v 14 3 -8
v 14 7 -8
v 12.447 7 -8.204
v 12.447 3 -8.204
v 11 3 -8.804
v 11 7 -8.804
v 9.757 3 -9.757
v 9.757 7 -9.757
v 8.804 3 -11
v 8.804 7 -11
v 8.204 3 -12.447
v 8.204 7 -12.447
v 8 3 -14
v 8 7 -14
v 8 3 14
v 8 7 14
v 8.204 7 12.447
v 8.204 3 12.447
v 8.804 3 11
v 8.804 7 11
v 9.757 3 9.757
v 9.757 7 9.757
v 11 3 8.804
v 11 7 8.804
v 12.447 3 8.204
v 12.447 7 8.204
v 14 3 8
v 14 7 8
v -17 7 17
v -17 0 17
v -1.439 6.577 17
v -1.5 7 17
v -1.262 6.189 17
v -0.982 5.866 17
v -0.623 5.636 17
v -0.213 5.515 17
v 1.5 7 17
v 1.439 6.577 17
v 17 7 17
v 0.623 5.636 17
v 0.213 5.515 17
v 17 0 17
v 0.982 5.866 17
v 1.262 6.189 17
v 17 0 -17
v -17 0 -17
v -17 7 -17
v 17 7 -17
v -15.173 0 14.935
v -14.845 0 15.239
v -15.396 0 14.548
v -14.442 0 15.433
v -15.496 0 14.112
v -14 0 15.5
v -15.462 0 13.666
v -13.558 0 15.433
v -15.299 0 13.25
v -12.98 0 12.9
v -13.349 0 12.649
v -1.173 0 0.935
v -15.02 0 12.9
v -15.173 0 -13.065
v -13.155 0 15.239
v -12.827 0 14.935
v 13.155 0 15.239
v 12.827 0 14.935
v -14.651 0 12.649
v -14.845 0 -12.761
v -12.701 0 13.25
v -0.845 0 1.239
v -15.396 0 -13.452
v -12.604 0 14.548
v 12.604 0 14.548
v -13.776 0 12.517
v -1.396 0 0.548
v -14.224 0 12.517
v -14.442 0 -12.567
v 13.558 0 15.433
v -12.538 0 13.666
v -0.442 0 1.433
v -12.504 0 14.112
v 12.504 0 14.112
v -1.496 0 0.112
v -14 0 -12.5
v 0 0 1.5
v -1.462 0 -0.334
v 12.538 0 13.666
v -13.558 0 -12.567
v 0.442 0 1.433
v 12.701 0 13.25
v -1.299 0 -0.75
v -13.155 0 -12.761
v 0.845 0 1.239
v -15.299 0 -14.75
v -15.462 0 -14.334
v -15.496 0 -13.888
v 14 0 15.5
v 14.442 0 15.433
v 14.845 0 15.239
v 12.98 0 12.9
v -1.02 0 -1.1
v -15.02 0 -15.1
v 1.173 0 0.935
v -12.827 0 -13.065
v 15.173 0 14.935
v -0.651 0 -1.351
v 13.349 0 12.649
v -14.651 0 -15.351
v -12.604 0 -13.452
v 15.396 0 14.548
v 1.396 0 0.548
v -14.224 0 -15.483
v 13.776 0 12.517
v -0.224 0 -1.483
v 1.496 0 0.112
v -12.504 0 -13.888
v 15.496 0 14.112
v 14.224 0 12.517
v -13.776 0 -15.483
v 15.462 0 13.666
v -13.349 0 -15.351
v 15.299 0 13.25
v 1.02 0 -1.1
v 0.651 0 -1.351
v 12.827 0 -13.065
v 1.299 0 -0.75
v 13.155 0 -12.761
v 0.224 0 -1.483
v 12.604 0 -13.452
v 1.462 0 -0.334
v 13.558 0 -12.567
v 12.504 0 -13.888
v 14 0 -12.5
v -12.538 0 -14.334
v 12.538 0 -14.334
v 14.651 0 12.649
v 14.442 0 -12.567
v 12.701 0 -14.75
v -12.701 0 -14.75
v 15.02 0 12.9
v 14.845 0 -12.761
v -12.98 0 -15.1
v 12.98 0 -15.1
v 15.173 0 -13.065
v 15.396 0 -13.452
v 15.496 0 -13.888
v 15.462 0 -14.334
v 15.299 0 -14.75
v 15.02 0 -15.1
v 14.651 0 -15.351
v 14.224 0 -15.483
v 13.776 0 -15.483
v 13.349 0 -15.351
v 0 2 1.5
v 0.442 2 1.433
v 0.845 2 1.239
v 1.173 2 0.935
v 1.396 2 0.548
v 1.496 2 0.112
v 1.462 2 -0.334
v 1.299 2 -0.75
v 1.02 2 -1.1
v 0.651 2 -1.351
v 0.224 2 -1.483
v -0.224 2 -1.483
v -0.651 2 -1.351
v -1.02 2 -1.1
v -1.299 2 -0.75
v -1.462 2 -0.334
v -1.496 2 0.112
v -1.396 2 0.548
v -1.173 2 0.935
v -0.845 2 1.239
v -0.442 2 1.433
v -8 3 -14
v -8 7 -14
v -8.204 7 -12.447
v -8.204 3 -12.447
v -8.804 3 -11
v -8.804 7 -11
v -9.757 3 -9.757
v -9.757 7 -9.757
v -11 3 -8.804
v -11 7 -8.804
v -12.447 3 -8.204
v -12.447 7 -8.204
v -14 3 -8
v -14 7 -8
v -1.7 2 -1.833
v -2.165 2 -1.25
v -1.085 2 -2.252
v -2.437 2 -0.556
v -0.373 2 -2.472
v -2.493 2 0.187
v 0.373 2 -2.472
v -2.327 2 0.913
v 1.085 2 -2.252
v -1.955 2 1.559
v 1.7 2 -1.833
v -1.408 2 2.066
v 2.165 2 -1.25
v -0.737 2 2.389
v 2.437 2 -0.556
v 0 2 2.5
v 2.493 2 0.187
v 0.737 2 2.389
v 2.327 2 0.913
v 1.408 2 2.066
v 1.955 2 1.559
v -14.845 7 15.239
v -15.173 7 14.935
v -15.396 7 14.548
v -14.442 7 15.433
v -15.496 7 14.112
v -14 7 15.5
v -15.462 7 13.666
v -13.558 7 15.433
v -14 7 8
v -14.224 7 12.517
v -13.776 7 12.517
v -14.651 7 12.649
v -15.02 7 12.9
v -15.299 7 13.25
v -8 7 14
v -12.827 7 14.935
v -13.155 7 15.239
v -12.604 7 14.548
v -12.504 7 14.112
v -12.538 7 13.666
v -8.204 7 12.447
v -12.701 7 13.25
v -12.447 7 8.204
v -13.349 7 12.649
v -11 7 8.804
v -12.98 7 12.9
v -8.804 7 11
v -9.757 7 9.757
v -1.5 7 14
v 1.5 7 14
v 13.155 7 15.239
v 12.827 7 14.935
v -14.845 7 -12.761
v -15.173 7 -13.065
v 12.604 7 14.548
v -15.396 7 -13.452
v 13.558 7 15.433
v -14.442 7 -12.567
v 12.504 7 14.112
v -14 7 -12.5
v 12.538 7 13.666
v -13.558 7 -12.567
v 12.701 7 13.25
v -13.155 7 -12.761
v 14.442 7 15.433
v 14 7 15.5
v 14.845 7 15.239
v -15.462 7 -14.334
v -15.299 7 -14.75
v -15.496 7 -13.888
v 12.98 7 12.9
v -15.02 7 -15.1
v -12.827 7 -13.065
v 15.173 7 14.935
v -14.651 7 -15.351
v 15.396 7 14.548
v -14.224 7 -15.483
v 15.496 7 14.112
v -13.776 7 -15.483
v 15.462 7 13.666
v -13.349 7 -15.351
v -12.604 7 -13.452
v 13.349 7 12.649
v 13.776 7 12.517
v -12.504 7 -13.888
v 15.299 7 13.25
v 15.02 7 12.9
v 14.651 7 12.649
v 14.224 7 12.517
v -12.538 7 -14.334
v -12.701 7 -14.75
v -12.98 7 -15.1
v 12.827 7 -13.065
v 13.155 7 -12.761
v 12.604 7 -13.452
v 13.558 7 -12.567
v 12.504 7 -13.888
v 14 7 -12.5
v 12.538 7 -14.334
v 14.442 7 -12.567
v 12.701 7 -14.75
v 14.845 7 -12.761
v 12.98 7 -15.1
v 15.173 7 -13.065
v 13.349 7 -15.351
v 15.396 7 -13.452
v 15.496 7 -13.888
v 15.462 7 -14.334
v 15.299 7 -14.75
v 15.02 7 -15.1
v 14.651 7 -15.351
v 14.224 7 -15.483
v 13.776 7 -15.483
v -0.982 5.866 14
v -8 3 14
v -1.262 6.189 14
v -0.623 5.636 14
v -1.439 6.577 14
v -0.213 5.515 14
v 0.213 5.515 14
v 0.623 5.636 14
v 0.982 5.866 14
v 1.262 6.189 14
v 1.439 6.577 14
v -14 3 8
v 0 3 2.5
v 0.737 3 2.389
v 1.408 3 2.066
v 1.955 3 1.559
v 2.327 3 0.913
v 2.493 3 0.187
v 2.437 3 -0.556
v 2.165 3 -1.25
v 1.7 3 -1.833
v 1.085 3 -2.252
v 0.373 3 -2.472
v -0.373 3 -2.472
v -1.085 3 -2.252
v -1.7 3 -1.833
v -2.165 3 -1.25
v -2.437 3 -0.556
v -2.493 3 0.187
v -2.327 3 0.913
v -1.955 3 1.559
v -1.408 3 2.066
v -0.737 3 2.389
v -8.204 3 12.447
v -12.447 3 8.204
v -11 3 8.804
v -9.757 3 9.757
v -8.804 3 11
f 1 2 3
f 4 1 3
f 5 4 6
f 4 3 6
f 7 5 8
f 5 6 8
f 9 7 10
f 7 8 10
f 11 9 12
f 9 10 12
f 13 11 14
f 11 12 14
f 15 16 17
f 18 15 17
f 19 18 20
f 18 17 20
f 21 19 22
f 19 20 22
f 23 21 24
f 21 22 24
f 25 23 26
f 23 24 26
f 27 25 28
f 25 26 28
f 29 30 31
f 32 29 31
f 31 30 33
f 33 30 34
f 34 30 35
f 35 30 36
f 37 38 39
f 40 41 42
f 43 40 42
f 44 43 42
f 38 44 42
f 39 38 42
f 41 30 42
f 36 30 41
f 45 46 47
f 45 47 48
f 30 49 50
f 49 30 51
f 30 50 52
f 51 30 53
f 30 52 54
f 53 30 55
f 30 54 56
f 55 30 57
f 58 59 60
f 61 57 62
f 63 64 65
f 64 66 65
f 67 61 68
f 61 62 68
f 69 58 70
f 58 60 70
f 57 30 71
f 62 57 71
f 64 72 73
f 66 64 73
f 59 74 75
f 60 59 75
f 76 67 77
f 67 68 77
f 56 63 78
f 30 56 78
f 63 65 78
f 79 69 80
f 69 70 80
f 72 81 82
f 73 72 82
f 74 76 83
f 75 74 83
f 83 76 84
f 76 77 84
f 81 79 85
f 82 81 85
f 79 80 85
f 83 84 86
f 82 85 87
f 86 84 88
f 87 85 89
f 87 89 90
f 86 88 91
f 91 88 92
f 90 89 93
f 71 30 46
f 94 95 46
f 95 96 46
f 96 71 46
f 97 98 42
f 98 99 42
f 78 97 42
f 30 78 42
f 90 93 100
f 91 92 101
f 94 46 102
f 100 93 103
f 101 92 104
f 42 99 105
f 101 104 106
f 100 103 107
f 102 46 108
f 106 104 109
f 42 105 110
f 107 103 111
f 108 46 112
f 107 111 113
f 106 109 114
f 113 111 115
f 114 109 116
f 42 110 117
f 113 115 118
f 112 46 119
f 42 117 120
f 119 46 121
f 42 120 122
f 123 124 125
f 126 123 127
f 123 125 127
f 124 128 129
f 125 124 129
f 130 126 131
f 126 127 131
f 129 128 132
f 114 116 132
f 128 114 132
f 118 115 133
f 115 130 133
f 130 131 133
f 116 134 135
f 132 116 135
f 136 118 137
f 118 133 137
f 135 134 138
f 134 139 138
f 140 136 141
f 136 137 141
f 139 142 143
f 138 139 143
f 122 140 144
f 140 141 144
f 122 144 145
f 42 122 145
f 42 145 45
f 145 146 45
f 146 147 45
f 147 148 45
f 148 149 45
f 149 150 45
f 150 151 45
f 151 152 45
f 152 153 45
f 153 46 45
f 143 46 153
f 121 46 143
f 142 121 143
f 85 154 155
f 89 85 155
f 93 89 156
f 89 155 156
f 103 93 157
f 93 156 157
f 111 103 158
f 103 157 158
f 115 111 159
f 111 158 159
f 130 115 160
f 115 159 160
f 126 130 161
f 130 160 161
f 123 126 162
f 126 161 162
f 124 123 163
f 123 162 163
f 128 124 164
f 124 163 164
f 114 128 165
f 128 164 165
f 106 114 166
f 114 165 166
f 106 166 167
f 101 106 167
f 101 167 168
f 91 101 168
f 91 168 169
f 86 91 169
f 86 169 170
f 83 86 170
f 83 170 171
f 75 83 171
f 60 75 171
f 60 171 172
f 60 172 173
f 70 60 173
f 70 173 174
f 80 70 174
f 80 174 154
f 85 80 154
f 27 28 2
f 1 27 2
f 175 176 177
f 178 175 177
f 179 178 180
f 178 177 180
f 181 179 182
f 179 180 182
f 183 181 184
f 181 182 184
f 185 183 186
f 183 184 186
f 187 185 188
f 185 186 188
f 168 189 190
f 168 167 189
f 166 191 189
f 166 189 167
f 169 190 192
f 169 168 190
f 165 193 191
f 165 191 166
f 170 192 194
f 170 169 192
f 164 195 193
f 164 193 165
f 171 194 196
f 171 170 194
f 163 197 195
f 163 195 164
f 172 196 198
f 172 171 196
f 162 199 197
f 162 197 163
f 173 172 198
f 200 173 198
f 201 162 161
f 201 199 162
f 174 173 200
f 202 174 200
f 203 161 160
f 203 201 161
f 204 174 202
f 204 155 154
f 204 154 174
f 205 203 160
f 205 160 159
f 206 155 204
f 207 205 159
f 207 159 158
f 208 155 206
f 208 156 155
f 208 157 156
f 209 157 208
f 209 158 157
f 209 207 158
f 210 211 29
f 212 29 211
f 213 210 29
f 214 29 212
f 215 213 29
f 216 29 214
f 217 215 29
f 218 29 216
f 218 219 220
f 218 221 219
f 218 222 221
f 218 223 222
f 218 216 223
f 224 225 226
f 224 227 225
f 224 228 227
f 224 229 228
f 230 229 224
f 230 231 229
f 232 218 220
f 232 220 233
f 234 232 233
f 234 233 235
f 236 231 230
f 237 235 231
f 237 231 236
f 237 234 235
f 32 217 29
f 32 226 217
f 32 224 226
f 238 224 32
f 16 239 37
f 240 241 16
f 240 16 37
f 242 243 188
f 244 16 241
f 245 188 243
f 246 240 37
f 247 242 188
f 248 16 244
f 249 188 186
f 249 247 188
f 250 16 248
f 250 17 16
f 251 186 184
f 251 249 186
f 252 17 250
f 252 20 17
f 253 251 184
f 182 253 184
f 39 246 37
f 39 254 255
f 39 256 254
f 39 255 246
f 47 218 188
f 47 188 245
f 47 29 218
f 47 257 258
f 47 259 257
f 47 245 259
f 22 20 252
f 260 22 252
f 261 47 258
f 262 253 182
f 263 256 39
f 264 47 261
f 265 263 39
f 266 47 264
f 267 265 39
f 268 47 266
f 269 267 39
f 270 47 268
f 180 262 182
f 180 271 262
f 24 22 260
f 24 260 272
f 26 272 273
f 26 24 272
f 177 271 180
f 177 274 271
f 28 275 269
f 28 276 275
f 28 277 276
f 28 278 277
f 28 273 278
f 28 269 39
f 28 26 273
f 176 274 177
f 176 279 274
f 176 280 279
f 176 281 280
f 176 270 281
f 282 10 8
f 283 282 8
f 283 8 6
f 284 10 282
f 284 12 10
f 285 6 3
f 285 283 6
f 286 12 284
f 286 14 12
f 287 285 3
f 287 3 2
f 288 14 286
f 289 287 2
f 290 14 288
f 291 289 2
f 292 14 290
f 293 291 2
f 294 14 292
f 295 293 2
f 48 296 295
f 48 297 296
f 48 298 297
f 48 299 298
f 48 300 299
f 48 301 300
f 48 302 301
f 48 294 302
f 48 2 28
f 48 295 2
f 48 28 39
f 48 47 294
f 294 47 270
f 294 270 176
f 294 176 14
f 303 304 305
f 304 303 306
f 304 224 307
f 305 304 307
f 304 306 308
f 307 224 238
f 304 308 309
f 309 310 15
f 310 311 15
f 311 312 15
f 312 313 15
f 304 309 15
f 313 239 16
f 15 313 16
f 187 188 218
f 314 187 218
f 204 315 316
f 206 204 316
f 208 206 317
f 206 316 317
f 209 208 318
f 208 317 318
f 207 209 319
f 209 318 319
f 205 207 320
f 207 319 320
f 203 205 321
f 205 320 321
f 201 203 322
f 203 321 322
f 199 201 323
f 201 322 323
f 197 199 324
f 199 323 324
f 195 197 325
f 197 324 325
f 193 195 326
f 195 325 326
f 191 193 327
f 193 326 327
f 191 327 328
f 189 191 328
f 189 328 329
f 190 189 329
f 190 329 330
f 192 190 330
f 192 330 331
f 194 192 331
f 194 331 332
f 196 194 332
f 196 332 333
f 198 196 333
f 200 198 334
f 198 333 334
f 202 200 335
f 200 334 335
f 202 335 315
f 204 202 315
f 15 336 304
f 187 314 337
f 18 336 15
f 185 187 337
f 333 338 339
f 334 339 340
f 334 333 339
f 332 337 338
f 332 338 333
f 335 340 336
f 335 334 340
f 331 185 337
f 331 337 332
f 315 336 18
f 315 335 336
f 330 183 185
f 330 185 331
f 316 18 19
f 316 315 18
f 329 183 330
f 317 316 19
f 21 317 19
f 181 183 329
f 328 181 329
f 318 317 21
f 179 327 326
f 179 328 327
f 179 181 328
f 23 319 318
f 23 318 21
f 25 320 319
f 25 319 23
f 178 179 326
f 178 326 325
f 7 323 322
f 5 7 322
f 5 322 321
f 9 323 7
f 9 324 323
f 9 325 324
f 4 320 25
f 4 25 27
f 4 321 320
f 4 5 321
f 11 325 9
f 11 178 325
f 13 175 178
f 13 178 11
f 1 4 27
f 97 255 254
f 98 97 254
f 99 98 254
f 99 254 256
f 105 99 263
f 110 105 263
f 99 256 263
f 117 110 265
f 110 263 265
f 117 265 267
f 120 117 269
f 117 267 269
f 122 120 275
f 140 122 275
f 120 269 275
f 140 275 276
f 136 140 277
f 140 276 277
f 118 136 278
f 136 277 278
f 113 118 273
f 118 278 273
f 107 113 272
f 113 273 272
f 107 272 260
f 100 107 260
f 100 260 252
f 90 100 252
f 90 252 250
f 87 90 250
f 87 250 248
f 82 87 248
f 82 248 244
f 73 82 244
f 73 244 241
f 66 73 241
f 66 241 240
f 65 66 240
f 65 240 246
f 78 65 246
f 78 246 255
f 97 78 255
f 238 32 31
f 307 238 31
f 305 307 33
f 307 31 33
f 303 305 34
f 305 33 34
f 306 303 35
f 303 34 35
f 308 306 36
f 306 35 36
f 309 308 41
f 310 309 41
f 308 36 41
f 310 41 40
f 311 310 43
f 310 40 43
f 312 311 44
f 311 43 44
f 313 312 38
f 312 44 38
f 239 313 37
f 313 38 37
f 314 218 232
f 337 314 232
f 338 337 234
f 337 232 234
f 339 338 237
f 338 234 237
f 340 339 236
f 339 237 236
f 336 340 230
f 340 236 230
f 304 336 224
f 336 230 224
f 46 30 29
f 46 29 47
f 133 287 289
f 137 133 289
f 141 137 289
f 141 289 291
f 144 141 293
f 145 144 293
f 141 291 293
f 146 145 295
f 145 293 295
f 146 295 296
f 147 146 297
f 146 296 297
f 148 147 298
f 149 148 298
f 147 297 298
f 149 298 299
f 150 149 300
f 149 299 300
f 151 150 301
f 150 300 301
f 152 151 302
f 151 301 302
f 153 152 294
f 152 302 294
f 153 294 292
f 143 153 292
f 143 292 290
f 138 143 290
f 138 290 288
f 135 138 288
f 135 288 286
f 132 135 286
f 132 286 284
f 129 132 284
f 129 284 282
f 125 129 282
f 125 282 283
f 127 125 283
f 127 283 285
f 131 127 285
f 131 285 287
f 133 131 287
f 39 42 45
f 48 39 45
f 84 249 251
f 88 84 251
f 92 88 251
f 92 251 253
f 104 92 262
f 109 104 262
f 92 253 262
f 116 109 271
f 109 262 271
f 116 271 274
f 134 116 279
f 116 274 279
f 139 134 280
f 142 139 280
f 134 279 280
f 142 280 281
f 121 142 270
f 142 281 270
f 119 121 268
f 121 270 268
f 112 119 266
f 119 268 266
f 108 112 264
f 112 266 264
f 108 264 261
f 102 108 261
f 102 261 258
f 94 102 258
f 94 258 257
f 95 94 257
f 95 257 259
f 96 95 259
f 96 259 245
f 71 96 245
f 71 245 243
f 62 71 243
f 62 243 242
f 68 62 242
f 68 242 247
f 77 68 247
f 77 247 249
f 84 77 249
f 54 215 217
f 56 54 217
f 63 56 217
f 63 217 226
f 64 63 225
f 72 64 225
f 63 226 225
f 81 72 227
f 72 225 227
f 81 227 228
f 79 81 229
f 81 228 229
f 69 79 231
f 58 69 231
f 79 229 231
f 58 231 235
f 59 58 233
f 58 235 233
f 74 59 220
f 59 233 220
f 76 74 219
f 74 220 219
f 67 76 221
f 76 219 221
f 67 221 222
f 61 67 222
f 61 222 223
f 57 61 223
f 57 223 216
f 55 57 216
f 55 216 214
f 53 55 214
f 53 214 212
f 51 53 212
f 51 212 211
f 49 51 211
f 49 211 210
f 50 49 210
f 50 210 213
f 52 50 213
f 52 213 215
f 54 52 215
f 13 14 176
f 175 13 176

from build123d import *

# Parameters (mm, degrees)
SKETCH1_W           = 34
SKETCH1_H           = 34
BOSS_EXTRUDE1_DEPTH = 7
CUT_EXTRUDE1_DEPTH  = 4
SKETCH3_R           = 1.5
CUT_EXTRUDE2_DEPTH  = 10
SKETCH4_R           = 1.5
CUT_EXTRUDE3_DEPTH  = 10
SKETCH5_R           = 1.5
CUT_EXTRUDE4_DEPTH  = 10
SKETCH6_R           = 2.5
CUT_EXTRUDE5_DEPTH  = 1


with BuildPart() as part:
    # Sketch1 → Boss-Extrude1 (new body)
    with BuildSketch(Plane(origin=(0, 0, 0), x_dir=(1, 0, 0), z_dir=(0, 1, 0))):
        Rectangle(SKETCH1_W, SKETCH1_H)
    extrude(amount=BOSS_EXTRUDE1_DEPTH)

    # Sketch2 → Cut-Extrude1 (cut)
    with BuildSketch(Plane(origin=(0, 7, 0), x_dir=(1, 0, 0), z_dir=(0, 1, 0))):
        with BuildLine():
            Line((8, 14), (-8, 14))
            ThreePointArc((-8, 14), (-9.757359313, 9.757359313), (-14, 8))
            Line((-14, 8), (-14, -8))
            ThreePointArc((-14, -8), (-9.757359313, -9.757359313), (-8, -14))
            Line((-8, -14), (8, -14))
            ThreePointArc((8, -14), (9.757359313, -9.757359313), (14, -8))
            Line((14, -8), (14, 8))
            ThreePointArc((14, 8), (9.757359313, 9.757359313), (8, 14))
        make_face()
    extrude(amount=-CUT_EXTRUDE1_DEPTH, mode=Mode.SUBTRACT)

    # Sketch3 → Cut-Extrude2 (cut)
    with BuildSketch(Plane.XY.offset(17)):
        with Locations((0, 7)):
            Circle(SKETCH3_R)
    extrude(amount=-CUT_EXTRUDE2_DEPTH, mode=Mode.SUBTRACT)

    # Sketch4 → Cut-Extrude3 (cut)
    with BuildSketch(Plane(origin=(0, 7, 0), x_dir=(1, 0, 0), z_dir=(0, 1, 0))):
        with Locations(Location((-14, 14, 0), (0, 0, 270))):
            Circle(SKETCH4_R)
        with Locations(Location((14, 14, 0), (0, 0, 270))):
            Circle(SKETCH4_R)
        with Locations(Location((14, -14, 0), (0, 0, 270))):
            Circle(SKETCH4_R)
        with Locations(Location((-14, -14, 0), (0, 0, 270))):
            Circle(SKETCH4_R)
    extrude(amount=-CUT_EXTRUDE3_DEPTH, mode=Mode.SUBTRACT)

    # Sketch5 → Cut-Extrude4 (cut)
    with BuildSketch(Plane(origin=(0, 3, 0), x_dir=(1, 0, 0), z_dir=(0, 1, 0))):
        with Locations(Location((0, 0, 0), (0, 0, 270))):
            Circle(SKETCH5_R)
    extrude(amount=-CUT_EXTRUDE4_DEPTH, mode=Mode.SUBTRACT)

    # Sketch6 → Cut-Extrude5 (cut)
    with BuildSketch(Plane(origin=(0, 3, 0), x_dir=(1, 0, 0), z_dir=(0, 1, 0))):
        with Locations(Location((0, 0, 0), (0, 0, 270))):
            Circle(SKETCH6_R)
    extrude(amount=-CUT_EXTRUDE5_DEPTH, mode=Mode.SUBTRACT)


solid = part.part
